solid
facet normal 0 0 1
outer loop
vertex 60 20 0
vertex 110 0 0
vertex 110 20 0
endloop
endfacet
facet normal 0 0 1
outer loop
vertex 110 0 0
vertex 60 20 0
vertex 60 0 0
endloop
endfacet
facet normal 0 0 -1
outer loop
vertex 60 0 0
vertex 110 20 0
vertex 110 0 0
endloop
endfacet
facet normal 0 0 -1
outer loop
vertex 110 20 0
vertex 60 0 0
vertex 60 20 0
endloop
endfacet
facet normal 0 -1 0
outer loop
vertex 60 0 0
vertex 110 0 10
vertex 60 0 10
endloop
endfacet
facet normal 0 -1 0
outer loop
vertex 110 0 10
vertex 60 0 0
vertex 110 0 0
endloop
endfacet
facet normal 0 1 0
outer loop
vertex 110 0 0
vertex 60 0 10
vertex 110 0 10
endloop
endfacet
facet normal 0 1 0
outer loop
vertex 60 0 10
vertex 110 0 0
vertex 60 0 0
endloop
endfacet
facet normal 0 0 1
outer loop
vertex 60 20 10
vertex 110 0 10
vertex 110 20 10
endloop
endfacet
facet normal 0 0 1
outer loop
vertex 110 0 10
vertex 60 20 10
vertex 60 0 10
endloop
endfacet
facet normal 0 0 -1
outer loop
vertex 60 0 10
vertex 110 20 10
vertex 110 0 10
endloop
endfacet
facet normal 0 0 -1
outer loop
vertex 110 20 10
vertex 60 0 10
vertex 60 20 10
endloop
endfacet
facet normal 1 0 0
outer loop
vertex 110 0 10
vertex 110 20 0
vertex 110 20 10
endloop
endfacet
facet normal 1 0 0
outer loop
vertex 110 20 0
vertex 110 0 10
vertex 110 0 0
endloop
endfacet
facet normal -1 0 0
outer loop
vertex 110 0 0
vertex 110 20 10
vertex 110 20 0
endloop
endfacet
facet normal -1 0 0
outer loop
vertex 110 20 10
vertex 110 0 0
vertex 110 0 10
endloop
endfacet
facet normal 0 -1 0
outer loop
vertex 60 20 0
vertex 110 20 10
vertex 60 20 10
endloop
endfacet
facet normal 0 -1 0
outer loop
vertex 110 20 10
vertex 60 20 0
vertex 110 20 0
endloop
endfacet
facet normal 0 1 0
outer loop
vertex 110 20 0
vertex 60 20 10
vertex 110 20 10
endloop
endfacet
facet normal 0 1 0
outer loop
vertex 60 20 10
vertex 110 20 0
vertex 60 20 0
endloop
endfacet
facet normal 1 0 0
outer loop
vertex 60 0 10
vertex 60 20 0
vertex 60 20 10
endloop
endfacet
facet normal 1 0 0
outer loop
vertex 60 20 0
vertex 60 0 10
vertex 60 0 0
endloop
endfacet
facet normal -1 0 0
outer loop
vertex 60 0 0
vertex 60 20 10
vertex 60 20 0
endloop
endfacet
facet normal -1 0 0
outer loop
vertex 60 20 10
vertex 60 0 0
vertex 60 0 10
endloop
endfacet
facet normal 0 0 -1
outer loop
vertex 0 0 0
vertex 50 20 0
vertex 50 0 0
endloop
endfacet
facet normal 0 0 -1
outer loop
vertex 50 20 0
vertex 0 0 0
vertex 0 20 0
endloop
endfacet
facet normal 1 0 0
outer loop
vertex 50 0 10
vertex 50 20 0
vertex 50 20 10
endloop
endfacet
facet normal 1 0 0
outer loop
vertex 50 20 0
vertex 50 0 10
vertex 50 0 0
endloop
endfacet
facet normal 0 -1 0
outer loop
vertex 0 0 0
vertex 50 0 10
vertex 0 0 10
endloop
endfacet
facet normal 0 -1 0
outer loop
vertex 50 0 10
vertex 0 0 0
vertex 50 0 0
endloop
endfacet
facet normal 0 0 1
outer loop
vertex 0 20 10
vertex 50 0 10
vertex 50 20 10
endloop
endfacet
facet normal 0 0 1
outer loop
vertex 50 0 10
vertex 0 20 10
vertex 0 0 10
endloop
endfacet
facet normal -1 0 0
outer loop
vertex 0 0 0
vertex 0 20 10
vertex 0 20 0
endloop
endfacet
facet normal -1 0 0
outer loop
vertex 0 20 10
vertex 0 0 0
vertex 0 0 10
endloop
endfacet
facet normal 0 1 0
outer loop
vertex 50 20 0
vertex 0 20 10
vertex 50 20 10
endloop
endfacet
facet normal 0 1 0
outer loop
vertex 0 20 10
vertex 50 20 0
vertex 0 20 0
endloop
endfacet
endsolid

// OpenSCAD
module PolyhedronExample(){
  union(){
    color("silver")polyhedron(points=[[0, 0, 0], [50, 0, 0], [50, 20, 0], [0, 20, 0], [0, 0, 10], [50, 0, 10], [50, 20, 10], [0, 20, 10]],faces=[[0, 1, 2, 3], [4, 5, 1, 0], [7, 6, 5, 4], [5, 6, 2, 1], [6, 7, 3, 2], [7, 4, 0, 3]],convexity=10);
    translate([60, 0, 0])union(){
        color("yellow")polyhedron(points=[[0, 0, 0], [50, 0, 0], [50, 20, 0], [0, 20, 0]],faces=[[0, 1, 2, 3], [3, 2, 1, 0]],convexity=10);
        color("orange")polyhedron(points=[[0, 0, 10], [50, 0, 10], [50, 0, 0], [0, 0, 0]],faces=[[0, 1, 2, 3], [3, 2, 1, 0]],convexity=10);
        color("red")polyhedron(points=[[0, 20, 10], [50, 20, 10], [50, 0, 10], [0, 0, 10]],faces=[[0, 1, 2, 3], [3, 2, 1, 0]],convexity=10);
        color("blue")polyhedron(points=[[50, 0, 10], [50, 20, 10], [50, 20, 0], [50, 0, 0]],faces=[[0, 1, 2, 3], [3, 2, 1, 0]],convexity=10);
        color("purple")polyhedron(points=[[50, 20, 10], [0, 20, 10], [0, 20, 0], [50, 20, 0]],faces=[[0, 1, 2, 3], [3, 2, 1, 0]],convexity=10);
        color("black")polyhedron(points=[[0, 20, 10], [0, 0, 10], [0, 0, 0], [0, 20, 0]],faces=[[0, 1, 2, 3], [3, 2, 1, 0]],convexity=10);
      }

  }
}
$fn=64;
PolyhedronExample();
